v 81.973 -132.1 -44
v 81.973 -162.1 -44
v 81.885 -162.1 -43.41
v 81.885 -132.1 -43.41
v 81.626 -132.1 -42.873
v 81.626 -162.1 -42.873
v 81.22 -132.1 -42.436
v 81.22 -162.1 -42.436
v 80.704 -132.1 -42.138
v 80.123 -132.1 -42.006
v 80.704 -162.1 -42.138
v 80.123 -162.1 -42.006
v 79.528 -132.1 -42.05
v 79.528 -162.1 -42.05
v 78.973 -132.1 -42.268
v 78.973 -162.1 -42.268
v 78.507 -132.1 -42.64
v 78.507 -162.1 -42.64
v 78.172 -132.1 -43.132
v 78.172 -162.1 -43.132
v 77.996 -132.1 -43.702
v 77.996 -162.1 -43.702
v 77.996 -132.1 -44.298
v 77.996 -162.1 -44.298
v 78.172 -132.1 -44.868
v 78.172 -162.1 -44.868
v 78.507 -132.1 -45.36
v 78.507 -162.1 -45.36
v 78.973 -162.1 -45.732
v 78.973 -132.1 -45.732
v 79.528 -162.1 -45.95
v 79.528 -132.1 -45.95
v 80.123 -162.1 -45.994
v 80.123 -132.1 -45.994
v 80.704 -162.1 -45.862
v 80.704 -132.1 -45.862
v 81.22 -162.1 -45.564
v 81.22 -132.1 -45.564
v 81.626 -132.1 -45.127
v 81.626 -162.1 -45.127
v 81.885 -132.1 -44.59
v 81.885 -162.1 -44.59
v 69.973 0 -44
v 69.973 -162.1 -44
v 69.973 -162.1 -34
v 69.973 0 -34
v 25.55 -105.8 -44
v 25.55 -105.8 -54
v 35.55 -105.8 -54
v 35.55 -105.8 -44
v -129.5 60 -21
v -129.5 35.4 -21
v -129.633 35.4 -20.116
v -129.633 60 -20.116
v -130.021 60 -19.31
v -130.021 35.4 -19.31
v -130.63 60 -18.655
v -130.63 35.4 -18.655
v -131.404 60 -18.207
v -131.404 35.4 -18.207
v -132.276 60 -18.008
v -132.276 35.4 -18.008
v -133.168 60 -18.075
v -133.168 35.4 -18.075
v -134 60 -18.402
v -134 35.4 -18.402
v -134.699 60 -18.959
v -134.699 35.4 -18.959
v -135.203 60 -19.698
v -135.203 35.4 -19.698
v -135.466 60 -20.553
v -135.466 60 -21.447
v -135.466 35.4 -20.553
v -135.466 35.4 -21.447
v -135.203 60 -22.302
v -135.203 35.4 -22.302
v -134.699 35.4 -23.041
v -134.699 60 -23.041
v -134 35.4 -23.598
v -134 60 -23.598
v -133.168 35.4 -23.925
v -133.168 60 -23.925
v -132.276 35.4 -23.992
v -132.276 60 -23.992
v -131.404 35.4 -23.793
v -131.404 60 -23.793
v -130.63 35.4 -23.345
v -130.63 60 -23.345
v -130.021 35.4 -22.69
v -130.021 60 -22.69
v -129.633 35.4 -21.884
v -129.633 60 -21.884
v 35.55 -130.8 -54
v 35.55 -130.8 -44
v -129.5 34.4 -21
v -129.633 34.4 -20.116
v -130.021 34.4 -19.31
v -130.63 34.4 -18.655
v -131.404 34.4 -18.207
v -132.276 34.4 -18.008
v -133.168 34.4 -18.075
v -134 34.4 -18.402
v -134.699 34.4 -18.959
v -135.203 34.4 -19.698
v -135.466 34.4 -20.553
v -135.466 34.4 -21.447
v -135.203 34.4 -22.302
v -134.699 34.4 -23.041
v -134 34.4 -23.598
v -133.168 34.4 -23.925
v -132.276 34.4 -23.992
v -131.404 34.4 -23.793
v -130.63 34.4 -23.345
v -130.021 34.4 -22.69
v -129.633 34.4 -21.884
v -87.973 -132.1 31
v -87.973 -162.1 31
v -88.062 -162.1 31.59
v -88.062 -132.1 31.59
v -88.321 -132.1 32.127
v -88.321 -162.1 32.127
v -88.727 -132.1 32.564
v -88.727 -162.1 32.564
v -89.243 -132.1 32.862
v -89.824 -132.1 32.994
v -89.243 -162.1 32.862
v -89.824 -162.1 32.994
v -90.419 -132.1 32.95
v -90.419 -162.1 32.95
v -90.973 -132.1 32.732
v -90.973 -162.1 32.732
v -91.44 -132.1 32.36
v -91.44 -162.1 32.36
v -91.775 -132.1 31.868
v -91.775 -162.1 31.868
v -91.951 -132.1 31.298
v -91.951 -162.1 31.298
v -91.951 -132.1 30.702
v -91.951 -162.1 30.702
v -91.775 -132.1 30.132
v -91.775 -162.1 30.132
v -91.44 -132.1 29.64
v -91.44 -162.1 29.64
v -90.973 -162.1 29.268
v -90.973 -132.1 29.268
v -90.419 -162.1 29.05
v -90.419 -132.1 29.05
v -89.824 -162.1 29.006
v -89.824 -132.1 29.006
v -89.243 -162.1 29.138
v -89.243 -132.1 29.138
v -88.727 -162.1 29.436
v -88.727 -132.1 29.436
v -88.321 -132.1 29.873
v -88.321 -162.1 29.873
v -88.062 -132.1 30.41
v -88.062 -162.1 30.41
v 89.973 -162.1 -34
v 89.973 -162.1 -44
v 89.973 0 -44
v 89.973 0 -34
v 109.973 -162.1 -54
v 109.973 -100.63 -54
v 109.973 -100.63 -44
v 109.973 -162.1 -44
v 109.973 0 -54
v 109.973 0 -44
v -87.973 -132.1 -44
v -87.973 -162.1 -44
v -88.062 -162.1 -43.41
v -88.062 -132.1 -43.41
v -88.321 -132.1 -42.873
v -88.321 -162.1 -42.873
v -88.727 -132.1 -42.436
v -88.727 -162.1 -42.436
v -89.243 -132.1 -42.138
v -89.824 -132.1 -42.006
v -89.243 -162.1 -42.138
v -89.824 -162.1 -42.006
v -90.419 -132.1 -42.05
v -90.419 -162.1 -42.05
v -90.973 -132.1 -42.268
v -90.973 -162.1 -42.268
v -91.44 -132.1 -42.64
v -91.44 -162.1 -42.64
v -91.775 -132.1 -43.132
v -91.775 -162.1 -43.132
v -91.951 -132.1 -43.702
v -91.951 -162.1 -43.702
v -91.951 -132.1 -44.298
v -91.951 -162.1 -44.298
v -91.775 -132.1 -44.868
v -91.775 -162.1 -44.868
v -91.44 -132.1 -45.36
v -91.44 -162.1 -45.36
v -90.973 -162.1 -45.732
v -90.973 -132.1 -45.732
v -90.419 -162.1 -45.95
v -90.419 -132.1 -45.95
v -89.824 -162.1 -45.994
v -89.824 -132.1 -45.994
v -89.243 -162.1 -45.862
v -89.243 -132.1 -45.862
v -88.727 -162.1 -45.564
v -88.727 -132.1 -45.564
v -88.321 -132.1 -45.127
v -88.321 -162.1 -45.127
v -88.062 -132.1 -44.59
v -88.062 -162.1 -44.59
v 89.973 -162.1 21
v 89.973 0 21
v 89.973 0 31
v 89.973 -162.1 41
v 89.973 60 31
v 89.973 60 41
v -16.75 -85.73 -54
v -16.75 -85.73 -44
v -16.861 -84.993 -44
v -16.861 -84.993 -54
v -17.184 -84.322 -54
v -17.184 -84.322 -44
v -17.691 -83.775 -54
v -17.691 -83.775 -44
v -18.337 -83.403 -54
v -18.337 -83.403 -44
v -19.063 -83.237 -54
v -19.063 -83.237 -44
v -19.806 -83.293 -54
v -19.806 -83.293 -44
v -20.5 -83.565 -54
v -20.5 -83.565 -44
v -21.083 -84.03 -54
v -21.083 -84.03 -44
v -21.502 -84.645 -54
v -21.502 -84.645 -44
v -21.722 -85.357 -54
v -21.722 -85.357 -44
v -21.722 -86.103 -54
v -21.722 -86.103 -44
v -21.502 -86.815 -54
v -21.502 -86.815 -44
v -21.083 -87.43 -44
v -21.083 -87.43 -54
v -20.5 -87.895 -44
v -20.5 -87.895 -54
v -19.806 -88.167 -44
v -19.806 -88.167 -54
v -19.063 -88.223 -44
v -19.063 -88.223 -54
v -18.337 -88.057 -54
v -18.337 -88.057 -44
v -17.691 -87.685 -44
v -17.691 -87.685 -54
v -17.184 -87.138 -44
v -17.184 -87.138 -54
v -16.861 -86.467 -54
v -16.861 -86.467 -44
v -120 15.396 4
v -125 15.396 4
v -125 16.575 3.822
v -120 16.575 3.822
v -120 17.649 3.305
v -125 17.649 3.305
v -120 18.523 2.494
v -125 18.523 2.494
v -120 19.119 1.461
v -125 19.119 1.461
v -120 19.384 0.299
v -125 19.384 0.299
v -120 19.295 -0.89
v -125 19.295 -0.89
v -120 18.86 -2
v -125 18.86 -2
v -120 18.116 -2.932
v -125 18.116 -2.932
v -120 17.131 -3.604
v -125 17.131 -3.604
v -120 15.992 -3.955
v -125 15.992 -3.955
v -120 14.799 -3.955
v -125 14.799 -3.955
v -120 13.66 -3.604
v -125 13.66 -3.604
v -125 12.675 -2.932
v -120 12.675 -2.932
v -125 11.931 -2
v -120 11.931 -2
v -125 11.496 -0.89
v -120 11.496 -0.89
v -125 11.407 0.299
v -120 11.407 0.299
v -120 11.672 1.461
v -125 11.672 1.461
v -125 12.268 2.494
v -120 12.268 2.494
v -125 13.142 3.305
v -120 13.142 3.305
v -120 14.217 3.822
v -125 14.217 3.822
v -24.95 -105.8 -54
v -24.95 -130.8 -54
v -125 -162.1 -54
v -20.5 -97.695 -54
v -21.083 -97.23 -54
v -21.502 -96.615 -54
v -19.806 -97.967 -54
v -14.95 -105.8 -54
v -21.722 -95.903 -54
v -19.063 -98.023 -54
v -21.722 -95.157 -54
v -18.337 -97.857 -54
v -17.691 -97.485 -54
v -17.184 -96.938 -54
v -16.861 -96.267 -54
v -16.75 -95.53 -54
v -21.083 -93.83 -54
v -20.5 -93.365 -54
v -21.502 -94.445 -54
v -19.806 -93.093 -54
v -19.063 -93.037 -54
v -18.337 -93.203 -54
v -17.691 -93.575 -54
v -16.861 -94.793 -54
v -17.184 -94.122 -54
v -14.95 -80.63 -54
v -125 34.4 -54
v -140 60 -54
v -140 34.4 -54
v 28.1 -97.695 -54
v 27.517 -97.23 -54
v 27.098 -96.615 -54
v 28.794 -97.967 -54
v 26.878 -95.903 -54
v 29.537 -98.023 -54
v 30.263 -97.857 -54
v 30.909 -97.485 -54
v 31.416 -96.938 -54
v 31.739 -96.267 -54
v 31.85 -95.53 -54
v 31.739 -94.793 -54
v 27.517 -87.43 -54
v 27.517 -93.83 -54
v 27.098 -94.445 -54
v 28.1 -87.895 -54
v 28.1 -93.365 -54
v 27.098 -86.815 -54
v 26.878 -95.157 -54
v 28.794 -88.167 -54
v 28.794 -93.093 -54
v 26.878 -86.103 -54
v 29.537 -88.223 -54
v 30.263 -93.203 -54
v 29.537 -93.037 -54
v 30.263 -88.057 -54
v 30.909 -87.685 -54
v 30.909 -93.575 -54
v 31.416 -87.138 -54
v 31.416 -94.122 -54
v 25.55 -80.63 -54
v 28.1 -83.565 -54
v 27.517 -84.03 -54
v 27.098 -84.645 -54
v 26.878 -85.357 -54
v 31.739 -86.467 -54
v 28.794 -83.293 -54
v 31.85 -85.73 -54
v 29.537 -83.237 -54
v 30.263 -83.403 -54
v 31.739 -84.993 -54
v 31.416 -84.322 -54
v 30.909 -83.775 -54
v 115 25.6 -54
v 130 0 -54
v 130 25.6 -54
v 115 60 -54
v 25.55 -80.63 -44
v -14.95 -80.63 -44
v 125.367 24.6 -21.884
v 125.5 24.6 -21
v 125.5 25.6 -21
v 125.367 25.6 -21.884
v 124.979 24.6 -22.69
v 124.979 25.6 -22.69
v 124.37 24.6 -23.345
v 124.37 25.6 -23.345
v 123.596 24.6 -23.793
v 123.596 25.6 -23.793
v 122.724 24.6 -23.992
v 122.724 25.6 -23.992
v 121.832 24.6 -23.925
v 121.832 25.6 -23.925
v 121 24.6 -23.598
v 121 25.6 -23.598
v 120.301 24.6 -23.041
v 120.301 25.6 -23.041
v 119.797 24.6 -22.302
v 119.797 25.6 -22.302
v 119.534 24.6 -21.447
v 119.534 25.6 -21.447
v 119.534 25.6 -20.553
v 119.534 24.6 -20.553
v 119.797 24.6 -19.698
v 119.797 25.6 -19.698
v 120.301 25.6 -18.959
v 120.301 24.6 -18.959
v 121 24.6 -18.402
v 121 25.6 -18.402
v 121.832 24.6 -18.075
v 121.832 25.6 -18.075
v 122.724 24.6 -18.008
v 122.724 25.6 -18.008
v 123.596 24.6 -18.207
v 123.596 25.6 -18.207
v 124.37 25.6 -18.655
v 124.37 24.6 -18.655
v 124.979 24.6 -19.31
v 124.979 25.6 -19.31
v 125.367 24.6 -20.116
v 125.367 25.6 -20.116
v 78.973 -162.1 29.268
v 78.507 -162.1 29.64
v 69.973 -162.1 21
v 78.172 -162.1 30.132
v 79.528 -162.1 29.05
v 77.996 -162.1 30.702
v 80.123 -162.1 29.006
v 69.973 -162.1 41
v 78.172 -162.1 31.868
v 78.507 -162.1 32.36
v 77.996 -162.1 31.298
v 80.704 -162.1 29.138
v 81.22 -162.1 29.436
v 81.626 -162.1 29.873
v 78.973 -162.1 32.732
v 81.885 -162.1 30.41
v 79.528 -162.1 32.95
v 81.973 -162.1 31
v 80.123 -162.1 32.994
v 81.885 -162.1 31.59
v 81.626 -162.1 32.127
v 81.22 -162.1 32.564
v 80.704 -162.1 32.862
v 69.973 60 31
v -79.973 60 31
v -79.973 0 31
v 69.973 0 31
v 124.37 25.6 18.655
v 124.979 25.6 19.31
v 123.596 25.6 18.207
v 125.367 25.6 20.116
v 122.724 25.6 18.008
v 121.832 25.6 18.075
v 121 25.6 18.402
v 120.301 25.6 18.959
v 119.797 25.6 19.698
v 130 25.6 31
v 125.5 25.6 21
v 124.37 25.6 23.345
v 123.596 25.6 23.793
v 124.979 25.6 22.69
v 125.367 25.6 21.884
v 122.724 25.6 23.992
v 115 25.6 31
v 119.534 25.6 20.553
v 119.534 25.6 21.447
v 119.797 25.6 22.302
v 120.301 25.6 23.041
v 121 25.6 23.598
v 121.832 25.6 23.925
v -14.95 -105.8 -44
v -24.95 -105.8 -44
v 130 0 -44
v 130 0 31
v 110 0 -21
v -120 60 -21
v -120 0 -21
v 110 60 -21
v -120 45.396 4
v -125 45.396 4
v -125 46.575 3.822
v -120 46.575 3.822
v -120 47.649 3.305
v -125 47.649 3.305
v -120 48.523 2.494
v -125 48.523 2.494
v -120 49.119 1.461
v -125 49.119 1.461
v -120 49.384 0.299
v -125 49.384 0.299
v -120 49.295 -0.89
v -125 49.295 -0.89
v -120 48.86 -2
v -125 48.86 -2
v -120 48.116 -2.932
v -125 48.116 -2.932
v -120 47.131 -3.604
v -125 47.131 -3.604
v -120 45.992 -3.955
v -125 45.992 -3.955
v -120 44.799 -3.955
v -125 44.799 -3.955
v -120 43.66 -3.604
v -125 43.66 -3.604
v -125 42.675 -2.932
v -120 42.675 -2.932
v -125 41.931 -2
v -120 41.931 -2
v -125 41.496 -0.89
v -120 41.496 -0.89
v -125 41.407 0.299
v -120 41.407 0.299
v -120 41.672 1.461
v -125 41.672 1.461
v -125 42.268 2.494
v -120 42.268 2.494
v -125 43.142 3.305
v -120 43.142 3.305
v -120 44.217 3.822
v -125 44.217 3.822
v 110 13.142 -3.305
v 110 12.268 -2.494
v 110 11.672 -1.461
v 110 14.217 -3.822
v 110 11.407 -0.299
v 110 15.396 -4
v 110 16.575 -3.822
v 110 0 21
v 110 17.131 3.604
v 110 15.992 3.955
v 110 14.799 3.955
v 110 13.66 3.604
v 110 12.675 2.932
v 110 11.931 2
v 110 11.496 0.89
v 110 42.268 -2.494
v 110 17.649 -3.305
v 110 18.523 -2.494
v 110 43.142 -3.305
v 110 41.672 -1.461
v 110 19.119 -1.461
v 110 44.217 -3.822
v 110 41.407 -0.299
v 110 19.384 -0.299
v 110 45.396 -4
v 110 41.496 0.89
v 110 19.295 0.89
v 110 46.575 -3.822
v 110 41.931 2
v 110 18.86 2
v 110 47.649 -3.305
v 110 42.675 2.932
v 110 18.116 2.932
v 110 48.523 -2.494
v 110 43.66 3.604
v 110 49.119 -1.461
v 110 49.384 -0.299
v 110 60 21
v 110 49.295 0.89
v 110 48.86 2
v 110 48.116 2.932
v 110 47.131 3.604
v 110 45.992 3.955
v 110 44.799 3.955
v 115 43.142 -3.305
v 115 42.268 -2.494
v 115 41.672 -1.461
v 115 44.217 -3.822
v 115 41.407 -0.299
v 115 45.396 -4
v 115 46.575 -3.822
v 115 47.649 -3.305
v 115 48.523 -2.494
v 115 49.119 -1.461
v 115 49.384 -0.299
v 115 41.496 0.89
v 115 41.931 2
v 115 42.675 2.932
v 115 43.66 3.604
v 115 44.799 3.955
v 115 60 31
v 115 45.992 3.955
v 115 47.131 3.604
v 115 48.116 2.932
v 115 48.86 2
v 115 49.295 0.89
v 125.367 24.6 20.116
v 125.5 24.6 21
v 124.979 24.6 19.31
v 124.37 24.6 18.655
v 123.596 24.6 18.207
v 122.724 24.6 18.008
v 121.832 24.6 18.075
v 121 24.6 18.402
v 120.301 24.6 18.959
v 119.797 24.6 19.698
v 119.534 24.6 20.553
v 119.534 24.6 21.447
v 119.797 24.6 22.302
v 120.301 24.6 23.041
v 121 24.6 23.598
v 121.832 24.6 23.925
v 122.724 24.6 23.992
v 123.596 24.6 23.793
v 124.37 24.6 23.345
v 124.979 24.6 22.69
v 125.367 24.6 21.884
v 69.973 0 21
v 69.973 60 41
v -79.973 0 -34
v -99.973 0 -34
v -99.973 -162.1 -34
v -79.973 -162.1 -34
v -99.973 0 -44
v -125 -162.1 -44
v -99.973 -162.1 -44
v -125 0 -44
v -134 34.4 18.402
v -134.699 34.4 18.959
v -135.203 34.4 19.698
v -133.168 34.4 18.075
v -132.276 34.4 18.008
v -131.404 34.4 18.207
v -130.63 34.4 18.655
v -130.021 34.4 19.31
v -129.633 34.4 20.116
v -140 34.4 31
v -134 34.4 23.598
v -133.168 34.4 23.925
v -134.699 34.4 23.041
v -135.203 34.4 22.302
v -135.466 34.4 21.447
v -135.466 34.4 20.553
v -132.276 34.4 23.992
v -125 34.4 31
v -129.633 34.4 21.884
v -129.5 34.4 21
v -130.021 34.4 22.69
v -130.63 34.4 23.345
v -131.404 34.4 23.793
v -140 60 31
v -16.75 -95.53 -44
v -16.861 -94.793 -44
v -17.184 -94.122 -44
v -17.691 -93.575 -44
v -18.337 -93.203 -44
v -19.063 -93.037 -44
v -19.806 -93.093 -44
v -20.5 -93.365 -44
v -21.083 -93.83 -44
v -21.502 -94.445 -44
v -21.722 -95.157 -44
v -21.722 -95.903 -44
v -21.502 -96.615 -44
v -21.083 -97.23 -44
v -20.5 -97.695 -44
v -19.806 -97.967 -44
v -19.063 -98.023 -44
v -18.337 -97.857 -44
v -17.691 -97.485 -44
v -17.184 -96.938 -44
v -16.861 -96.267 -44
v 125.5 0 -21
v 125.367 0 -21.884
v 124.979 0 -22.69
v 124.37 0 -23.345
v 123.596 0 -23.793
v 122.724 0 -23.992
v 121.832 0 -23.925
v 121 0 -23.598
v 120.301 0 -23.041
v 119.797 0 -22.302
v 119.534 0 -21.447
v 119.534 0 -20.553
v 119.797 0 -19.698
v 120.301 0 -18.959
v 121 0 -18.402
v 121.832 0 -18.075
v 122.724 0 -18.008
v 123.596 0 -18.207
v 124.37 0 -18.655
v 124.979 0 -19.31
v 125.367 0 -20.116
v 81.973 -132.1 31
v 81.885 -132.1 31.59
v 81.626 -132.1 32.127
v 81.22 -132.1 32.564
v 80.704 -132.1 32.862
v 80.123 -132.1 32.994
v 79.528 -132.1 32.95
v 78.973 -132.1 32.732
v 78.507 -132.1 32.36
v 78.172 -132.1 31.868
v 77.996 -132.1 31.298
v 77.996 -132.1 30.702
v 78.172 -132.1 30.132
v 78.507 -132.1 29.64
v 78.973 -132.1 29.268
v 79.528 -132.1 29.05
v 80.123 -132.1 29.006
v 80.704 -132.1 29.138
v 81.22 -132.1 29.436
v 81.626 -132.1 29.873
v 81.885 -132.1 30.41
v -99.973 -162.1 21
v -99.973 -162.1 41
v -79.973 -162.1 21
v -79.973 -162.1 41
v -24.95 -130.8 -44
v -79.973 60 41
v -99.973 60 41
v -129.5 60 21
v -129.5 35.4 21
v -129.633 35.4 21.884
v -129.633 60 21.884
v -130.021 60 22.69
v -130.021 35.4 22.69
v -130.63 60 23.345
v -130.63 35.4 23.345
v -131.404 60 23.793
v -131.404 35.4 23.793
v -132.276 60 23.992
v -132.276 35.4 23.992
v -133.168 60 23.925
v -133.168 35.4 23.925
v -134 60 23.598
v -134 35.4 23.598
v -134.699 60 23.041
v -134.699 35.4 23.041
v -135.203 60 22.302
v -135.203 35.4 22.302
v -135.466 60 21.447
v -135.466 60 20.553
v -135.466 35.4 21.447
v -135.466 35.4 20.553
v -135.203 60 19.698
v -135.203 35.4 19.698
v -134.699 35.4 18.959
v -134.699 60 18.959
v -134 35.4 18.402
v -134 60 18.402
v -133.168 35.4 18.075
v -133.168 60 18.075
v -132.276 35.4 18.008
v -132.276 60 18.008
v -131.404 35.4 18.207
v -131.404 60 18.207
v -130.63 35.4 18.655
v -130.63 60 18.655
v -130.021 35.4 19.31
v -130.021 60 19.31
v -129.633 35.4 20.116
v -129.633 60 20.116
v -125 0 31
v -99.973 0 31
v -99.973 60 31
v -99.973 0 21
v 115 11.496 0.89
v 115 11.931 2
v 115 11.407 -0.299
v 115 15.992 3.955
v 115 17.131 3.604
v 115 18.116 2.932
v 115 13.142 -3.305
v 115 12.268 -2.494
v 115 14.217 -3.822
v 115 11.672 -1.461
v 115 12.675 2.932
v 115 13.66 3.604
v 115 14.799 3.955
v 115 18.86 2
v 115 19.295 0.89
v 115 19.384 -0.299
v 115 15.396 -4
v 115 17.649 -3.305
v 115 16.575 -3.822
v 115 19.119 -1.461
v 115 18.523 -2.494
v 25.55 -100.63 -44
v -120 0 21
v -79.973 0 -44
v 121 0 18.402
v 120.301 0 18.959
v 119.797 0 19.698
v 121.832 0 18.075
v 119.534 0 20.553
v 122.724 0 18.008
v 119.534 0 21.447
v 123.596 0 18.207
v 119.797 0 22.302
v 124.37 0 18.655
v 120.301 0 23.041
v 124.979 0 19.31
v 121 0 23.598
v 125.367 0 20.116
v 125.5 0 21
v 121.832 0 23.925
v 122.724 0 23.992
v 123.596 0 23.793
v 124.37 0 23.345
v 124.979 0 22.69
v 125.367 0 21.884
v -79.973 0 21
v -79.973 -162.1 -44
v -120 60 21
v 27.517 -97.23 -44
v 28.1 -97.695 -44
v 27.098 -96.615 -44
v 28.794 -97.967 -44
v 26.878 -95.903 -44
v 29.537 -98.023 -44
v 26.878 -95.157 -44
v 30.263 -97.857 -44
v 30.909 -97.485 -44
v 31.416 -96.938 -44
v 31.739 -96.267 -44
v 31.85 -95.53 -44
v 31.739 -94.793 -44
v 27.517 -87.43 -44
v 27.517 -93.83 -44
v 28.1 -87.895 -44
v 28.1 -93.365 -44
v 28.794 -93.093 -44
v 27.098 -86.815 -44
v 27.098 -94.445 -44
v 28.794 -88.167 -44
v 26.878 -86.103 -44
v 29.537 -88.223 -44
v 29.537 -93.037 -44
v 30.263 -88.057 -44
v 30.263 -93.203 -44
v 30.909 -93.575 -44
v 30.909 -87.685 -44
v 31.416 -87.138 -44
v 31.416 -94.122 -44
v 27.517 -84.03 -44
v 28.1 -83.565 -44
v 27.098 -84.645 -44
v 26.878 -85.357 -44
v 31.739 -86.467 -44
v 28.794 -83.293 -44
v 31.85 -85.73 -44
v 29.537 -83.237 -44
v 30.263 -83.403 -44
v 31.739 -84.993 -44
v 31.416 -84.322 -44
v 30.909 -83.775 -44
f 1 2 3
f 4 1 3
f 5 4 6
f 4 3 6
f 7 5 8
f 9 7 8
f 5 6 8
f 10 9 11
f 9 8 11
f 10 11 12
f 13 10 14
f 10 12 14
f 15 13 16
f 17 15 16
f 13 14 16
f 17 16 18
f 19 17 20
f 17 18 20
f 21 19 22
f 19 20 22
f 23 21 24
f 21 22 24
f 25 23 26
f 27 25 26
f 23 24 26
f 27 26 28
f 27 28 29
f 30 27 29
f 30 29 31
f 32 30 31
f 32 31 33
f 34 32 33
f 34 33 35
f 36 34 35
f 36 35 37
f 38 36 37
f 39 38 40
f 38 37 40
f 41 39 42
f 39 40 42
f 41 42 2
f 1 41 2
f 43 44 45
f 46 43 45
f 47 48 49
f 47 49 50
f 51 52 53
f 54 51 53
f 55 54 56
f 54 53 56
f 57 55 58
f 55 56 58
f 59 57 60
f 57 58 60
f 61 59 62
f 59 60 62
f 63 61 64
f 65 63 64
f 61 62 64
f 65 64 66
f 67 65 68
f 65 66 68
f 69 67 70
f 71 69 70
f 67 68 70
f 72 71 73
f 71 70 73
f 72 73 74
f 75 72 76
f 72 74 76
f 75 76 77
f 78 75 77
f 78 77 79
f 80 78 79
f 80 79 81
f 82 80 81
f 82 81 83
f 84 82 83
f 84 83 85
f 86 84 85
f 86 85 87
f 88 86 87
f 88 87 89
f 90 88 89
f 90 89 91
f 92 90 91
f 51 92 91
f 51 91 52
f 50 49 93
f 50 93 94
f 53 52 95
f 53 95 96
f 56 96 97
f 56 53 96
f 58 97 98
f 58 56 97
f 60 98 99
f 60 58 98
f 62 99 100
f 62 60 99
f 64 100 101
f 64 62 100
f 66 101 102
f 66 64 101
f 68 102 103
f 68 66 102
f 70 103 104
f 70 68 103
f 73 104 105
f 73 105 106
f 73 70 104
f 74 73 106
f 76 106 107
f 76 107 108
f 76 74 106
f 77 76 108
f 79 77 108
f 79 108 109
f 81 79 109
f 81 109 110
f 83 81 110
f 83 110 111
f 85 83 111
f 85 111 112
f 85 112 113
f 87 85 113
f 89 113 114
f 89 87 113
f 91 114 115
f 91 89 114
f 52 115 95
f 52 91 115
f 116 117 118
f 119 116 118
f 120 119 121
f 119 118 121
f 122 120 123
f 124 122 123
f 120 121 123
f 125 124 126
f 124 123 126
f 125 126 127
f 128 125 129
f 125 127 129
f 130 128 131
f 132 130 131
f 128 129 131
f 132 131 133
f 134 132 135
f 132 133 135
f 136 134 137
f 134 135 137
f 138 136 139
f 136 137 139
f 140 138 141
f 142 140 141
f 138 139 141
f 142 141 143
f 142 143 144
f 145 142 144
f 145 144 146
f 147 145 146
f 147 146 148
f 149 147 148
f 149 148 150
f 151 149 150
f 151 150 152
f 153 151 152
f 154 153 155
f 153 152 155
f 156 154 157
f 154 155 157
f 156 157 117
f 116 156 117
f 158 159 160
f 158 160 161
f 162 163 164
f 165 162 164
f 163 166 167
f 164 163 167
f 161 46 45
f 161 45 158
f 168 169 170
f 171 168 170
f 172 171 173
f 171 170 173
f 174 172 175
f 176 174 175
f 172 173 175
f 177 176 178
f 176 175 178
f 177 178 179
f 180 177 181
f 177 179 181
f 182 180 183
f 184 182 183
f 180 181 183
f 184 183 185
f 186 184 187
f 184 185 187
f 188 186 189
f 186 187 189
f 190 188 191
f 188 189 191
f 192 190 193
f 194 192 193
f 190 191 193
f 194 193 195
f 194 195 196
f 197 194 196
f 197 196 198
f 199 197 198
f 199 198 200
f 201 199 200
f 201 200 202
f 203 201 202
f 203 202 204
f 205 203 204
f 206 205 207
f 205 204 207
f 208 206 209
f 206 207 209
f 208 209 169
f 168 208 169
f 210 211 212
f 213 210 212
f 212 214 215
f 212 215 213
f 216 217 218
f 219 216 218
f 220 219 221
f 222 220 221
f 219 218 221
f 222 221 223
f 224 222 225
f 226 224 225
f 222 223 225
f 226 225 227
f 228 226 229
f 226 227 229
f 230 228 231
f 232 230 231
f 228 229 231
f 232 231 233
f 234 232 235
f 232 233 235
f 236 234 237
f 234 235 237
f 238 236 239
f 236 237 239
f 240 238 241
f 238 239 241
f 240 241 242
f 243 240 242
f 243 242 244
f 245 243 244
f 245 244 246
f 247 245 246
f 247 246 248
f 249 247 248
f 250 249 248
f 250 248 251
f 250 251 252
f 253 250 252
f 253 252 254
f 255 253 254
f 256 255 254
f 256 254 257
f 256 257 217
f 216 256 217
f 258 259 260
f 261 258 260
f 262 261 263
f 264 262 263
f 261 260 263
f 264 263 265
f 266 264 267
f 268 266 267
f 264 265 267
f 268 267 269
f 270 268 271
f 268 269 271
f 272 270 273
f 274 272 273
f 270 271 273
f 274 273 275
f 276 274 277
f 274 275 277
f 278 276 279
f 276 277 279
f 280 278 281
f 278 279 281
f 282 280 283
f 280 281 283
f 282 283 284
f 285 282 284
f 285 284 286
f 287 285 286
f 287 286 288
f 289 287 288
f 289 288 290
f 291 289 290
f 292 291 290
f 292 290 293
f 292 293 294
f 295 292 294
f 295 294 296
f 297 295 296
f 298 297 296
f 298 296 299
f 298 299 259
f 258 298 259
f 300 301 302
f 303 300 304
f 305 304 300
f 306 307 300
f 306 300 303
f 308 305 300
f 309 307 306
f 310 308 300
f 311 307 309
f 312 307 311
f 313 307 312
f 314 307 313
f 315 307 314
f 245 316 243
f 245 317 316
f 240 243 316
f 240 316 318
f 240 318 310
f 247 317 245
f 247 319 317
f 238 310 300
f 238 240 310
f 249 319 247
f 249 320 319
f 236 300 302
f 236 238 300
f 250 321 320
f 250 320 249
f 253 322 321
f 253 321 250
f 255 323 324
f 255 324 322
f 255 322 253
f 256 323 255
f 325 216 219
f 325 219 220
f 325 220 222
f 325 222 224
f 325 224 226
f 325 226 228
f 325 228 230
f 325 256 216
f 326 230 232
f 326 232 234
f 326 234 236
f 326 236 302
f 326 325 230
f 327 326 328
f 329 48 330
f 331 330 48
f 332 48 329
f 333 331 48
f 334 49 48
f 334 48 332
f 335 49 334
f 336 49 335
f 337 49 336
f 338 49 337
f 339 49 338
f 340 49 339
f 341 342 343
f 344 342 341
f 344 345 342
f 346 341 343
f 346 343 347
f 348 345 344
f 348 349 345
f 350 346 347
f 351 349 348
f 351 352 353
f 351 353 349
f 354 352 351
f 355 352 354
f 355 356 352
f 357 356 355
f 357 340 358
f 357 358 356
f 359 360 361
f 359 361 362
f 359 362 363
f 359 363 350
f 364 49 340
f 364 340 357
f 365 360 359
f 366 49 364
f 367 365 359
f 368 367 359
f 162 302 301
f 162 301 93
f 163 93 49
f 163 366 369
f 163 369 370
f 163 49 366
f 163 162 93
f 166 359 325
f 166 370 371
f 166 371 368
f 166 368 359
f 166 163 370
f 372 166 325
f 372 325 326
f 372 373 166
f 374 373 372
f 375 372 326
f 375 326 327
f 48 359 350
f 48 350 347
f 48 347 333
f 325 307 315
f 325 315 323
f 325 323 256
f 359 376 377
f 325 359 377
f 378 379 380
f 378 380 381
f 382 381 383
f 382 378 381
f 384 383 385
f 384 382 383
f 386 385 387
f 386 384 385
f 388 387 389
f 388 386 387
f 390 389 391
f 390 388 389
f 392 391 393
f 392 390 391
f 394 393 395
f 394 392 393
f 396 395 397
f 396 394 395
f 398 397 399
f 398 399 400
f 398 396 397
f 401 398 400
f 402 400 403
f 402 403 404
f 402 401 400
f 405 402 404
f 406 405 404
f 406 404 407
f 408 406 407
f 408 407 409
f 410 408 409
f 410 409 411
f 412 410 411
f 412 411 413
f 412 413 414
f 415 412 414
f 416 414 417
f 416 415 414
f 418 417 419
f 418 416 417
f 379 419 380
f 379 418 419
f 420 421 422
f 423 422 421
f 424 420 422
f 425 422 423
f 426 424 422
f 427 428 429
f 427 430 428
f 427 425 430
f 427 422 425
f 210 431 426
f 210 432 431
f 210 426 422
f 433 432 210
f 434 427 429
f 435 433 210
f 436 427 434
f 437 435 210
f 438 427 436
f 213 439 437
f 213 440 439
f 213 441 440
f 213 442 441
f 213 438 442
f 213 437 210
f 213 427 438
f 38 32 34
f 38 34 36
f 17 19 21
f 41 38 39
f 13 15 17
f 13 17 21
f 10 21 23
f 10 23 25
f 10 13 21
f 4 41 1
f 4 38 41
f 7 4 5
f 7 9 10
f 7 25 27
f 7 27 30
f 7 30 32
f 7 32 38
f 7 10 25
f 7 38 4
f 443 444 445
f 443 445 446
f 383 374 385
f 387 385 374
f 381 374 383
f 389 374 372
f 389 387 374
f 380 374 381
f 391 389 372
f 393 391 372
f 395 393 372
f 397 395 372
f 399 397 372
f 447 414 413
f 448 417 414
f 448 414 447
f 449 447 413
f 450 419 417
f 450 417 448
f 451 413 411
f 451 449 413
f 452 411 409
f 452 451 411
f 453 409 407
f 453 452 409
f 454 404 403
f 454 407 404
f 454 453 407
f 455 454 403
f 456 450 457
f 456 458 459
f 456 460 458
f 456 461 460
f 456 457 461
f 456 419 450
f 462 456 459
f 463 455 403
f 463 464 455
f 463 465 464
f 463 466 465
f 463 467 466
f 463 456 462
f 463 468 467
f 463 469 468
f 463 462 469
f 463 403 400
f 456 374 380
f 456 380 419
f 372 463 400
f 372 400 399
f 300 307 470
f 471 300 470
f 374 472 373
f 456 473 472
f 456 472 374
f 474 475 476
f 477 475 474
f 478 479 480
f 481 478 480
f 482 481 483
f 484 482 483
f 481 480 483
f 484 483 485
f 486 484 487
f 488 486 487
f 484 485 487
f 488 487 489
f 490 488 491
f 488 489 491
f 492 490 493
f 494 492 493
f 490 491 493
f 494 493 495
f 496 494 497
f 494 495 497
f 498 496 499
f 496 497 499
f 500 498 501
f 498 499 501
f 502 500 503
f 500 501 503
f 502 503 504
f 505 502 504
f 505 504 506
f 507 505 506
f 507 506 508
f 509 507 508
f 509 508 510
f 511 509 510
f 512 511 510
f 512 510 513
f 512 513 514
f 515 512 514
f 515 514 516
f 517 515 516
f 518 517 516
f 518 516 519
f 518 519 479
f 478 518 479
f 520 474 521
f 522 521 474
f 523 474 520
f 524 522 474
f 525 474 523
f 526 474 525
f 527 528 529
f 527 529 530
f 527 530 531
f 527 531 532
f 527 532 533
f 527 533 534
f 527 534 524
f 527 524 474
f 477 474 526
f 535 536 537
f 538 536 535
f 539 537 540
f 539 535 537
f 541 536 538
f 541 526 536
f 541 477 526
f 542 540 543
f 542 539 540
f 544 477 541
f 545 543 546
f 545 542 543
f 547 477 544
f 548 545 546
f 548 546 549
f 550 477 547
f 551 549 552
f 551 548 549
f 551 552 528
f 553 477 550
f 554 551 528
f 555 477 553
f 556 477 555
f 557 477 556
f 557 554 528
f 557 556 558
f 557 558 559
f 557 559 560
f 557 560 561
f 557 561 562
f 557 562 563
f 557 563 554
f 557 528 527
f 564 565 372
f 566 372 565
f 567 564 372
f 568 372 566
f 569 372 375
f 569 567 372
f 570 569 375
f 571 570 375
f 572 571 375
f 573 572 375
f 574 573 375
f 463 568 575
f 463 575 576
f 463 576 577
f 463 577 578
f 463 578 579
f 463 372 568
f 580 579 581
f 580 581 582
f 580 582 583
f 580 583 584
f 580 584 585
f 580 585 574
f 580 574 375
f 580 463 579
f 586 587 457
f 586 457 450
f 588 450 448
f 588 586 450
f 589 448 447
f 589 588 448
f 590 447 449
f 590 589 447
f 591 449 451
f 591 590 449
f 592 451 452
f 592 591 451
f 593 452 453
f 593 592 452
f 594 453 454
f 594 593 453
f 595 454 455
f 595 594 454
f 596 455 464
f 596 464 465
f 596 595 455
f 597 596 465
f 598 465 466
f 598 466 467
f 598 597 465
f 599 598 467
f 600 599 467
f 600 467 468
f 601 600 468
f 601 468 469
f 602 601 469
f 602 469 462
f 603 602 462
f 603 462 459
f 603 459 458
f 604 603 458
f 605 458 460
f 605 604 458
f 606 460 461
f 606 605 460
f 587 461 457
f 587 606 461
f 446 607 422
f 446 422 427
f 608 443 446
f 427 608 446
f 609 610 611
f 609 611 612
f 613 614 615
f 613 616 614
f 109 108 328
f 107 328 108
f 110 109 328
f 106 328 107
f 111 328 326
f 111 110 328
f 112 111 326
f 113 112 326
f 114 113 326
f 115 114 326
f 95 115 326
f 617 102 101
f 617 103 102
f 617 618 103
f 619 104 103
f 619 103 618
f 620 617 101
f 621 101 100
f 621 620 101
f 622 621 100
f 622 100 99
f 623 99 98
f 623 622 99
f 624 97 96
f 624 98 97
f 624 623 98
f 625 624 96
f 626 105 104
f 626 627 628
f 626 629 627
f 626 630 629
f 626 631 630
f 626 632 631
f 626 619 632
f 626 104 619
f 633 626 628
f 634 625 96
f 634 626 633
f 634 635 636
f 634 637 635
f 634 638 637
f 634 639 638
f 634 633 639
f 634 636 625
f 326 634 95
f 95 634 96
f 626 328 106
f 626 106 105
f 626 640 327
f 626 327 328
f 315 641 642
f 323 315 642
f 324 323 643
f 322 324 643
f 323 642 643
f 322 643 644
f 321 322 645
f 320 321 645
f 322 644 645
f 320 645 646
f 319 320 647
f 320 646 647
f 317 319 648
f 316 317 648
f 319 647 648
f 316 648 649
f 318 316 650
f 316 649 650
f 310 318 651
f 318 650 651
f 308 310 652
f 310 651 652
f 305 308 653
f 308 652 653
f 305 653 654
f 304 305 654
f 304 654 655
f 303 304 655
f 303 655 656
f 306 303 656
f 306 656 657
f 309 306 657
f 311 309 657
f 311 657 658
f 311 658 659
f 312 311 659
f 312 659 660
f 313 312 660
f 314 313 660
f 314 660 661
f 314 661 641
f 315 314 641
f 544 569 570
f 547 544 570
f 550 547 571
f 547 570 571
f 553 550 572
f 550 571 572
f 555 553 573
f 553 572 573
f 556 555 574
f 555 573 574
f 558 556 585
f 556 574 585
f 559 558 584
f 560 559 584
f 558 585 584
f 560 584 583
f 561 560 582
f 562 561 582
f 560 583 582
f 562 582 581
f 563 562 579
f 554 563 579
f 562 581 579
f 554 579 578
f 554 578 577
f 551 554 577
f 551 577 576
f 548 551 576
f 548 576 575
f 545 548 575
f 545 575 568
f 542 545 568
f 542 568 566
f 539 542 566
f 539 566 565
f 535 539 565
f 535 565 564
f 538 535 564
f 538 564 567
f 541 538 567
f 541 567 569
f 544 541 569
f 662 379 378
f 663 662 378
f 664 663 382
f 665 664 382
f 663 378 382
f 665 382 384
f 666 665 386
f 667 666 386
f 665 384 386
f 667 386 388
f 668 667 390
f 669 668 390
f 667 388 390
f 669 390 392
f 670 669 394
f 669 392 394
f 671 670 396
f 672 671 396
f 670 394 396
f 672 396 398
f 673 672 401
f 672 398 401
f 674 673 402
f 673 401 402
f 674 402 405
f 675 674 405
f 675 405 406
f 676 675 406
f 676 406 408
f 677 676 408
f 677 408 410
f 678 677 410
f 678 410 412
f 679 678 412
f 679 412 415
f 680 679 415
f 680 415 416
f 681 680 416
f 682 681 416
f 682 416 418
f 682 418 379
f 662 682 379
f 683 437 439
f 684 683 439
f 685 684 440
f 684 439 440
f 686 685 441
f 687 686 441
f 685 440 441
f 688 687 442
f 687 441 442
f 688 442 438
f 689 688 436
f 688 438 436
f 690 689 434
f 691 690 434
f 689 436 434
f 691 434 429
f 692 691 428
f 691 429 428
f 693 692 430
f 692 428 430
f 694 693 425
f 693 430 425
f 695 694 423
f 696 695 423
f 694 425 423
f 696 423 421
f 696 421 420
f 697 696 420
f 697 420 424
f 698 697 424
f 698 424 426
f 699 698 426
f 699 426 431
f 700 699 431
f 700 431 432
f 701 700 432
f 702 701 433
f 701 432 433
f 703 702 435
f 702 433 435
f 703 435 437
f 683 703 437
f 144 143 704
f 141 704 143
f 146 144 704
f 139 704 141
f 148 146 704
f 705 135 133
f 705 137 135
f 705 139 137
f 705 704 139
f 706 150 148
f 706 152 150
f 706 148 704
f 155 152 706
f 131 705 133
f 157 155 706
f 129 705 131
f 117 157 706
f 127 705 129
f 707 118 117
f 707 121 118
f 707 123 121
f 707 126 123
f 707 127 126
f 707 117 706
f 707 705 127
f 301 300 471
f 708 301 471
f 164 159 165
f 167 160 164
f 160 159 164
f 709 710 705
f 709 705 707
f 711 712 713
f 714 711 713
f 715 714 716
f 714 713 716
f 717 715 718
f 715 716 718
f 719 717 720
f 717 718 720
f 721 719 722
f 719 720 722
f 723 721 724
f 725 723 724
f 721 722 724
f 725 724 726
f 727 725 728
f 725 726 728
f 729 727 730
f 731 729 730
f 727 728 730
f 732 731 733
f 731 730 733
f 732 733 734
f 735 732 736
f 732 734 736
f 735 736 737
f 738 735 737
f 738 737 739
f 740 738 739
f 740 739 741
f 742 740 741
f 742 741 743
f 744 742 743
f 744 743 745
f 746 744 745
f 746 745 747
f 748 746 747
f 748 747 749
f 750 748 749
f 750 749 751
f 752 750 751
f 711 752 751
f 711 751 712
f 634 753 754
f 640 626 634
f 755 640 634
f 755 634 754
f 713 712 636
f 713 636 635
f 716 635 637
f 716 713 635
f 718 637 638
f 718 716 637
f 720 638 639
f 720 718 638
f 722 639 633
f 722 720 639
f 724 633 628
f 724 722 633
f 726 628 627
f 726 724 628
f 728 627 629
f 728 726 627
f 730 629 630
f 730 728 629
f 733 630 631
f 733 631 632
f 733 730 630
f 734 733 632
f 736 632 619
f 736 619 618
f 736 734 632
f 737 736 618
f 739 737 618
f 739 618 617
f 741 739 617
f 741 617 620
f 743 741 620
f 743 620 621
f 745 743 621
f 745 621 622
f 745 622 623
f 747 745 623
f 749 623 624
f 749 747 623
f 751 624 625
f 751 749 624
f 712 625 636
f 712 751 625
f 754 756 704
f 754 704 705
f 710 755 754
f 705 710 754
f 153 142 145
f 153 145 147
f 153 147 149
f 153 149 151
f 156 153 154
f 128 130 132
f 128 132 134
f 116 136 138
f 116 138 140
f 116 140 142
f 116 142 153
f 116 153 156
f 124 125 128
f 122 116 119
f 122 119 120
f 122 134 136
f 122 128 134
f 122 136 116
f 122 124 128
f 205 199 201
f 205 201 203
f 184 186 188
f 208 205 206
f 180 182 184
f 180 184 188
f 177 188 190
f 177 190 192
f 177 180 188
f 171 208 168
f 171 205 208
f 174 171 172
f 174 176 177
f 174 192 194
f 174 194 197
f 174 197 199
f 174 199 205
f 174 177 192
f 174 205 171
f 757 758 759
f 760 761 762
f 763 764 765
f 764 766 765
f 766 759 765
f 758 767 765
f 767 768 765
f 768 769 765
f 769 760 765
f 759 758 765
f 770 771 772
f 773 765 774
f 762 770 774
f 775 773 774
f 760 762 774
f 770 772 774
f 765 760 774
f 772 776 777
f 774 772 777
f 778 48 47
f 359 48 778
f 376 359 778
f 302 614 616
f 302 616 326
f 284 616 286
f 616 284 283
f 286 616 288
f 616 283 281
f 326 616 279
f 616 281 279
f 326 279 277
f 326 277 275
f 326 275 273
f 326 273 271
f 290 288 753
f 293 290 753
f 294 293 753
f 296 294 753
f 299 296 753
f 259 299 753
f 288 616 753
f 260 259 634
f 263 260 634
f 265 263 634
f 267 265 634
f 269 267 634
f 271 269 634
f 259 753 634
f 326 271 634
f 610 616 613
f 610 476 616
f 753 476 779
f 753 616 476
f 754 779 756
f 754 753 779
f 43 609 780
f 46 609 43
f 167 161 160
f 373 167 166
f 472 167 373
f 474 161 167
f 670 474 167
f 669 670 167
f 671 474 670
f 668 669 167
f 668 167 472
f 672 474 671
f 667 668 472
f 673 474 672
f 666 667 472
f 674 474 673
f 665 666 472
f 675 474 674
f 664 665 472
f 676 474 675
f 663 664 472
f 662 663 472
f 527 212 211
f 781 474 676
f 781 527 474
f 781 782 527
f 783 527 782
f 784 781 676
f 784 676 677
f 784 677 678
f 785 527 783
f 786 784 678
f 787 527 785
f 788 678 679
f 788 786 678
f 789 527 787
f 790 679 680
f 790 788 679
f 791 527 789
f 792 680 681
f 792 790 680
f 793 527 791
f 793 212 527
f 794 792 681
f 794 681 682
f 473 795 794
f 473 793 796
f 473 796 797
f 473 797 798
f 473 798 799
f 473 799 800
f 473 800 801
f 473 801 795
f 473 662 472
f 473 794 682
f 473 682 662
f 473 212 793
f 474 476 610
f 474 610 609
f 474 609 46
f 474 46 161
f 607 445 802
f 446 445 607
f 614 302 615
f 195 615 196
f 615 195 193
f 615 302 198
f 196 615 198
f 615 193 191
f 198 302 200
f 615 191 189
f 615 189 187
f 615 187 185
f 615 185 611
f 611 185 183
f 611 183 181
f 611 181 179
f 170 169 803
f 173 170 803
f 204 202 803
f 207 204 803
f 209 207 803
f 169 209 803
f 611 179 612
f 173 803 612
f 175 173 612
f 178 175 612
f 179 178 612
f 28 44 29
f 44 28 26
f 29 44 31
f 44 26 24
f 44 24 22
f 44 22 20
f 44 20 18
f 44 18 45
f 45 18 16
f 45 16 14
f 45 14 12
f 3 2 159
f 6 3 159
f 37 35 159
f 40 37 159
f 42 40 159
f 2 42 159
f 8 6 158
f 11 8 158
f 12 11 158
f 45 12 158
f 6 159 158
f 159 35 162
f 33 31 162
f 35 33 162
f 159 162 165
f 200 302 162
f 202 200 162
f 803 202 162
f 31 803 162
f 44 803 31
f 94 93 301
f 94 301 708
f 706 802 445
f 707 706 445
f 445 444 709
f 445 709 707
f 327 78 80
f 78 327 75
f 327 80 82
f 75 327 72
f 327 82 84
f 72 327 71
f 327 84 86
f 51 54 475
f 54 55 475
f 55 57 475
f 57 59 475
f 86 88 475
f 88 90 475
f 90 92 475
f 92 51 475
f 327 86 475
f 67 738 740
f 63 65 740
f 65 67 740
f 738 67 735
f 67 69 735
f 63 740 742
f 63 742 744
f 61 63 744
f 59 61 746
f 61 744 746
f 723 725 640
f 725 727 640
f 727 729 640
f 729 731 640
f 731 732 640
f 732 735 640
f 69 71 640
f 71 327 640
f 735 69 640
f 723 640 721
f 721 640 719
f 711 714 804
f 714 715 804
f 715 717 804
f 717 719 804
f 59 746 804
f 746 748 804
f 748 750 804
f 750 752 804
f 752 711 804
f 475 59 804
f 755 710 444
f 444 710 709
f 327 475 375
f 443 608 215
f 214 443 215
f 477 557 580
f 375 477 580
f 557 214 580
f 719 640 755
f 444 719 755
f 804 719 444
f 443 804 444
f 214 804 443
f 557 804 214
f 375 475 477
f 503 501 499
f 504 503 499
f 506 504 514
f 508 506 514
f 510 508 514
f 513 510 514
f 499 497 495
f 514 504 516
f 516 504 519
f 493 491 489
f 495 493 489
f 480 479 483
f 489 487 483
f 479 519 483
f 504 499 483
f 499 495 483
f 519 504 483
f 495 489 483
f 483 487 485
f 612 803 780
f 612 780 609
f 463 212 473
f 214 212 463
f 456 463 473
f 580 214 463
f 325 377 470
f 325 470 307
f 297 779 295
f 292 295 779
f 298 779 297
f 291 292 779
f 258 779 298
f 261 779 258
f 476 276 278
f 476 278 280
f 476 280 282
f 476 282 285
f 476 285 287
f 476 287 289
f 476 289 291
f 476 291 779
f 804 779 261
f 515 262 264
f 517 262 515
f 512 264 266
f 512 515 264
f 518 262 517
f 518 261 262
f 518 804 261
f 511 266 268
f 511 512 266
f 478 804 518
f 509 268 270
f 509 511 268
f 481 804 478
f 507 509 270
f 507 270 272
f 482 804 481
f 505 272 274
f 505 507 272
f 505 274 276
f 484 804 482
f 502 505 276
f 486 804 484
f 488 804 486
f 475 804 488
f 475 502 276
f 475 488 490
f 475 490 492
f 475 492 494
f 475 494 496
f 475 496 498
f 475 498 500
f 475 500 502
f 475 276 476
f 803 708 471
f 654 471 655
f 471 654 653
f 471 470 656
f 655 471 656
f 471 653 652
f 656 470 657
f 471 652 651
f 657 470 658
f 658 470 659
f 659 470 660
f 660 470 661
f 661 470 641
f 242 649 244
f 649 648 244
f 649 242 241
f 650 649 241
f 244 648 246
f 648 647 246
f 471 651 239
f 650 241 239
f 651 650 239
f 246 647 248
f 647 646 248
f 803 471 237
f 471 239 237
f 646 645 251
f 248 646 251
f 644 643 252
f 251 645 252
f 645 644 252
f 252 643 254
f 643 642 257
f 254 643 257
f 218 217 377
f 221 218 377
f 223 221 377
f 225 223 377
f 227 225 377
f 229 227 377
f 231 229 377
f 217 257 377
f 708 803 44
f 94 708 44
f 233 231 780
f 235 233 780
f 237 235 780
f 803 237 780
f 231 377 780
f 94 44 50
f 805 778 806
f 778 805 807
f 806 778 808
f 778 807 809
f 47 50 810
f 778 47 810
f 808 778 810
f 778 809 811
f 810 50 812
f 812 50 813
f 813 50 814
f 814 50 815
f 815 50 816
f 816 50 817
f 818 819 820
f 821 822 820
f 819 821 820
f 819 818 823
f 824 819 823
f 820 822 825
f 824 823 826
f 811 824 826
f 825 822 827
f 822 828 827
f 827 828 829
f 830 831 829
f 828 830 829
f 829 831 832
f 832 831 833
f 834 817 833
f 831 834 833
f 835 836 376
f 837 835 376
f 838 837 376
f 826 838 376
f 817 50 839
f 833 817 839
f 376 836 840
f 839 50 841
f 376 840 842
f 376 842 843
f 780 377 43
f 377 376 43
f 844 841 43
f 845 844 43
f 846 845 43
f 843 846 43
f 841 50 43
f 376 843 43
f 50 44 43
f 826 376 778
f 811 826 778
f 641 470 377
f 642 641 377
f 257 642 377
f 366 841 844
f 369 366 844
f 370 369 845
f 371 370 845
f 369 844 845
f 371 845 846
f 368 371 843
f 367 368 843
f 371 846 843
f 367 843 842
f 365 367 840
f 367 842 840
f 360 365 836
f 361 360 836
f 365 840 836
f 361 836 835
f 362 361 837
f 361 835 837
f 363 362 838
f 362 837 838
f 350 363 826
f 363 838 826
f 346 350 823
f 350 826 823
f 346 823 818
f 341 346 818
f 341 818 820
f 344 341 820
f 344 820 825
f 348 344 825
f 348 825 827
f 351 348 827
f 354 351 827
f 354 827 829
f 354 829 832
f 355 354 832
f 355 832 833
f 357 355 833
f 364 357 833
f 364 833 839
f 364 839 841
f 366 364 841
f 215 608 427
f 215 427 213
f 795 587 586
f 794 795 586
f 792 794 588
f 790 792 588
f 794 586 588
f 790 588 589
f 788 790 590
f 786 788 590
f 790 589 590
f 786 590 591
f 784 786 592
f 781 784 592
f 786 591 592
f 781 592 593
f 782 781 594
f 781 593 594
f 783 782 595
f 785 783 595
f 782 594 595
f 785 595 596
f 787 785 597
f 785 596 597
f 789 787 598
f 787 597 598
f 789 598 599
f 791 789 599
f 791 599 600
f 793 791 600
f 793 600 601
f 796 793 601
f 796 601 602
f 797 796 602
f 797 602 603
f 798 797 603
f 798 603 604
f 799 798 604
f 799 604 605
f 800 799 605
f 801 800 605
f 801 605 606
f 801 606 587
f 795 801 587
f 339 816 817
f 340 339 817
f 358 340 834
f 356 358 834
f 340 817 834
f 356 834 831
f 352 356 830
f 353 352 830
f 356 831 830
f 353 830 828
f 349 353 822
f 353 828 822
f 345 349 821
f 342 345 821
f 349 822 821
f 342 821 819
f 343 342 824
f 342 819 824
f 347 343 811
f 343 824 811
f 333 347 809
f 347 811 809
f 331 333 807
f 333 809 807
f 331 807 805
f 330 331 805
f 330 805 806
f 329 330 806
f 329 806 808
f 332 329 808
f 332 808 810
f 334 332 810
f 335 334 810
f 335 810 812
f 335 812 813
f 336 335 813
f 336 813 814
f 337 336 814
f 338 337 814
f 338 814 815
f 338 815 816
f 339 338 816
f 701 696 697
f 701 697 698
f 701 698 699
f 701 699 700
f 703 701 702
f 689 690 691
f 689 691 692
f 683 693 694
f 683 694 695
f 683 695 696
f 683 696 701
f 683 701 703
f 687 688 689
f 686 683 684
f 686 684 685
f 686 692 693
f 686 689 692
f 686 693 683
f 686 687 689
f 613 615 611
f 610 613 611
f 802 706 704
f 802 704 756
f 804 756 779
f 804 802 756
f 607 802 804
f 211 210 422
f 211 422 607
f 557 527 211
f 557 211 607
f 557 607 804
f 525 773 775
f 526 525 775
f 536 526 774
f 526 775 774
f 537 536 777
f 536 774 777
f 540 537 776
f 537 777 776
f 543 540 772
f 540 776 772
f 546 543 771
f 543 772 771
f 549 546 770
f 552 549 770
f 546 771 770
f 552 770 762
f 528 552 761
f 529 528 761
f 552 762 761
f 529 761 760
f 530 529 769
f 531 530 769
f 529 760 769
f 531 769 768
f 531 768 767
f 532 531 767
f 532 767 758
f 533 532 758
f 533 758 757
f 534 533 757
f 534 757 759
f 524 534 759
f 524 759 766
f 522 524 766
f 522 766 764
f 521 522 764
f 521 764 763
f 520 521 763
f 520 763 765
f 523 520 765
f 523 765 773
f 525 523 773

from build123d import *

# Parameters (mm, degrees)
SKETCH2_W            = 230
SKETCH2_H            = 42
BOSS_EXTRUDE1_DEPTH  = 60
BOSS_EXTRUDE2_DEPTH  = 150
SKETCH5_R            = 4
CUT_EXTRUDE1_DEPTH   = 277
SKETCH7_R            = 4
BOSS_EXTRUDE3_DEPTH  = 20
SKETCH7_2_R          = 4
CUT_EXTRUDE2_DEPTH   = 10
SKETCH8_W            = 62
SKETCH8_H            = 24.6
BOSS_EXTRUDE4_DEPTH  = 14
SKETCH9_W            = 62
SKETCH9_H            = 24.6
BOSS_EXTRUDE5_DEPTH  = 14
SKETCH15_W           = 42
SKETCH15_H           = 60
SKETCH15_R           = 4
CUT_EXTRUDE3_DEPTH   = 5
SKETCH17_W           = 42
SKETCH17_H           = 60
SKETCH17_R           = 4
CUT_EXTRUDE4_DEPTH   = 5
SKETCH18_W           = 1
SKETCH18_H           = 62
BOSS_EXTRUDE9_DEPTH  = 24.6
SKETCH18_3_R         = 3
CUT_EXTRUDE5_DEPTH   = 35
SKETCH19_W           = 1
SKETCH19_H           = 62
BOSS_EXTRUDE10_DEPTH = 24.6
SKETCH19_3_R         = 3
CUT_EXTRUDE6_DEPTH   = 27
SKETCH20_W           = 15
SKETCH20_H           = 62
SKETCH20_R           = 3
BOSS_EXTRUDE11_DEPTH = 1
SKETCH21_W           = 15
SKETCH21_H           = 62
SKETCH21_R           = 3
BOSS_EXTRUDE12_DEPTH = 1
SKETCH23_W           = 255
SKETCH23_H           = 10
BOSS_EXTRUDE13_DEPTH = 150
SKETCH25_W           = 251.390716306
SKETCH25_H           = 22.262694164
CUT_EXTRUDE7_DEPTH   = 150
BOSS_EXTRUDE16_DEPTH = 17
CUT_EXTRUDE8_DEPTH   = 150
SKETCH28_W           = 255
SKETCH28_H           = 13
CUT_EXTRUDE9_DEPTH   = 167
BOSS_EXTRUDE18_DEPTH = 6
CUT_EXTRUDE10_DEPTH  = 43
SKETCH32_W           = 10
SKETCH32_H           = 20
BOSS_EXTRUDE19_DEPTH = 7.5
SKETCH33_W           = 10
SKETCH33_H           = 20
BOSS_EXTRUDE20_DEPTH = 8
SKETCH38_R           = 2.5
CUT_EXTRUDE12_DEPTH  = 16
SKETCH40_W           = 20.026518065
SKETCH40_H           = 12.666252083
CUT_EXTRUDE13_DEPTH  = 116
SKETCH41_W           = 84.423481935
SKETCH41_H           = 10
SKETCH41_W_2         = 110.05
BOSS_EXTRUDE21_DEPTH = 61.47
SKETCH42_W           = 10
SKETCH42_H           = 25
CUT_EXTRUDE14_DEPTH  = 10
SKETCH40_3_W         = 20
SKETCH40_3_H         = 10
BOSS_EXTRUDE22_DEPTH = 162.1
SKETCH43_W           = 10
SKETCH43_H           = 31.300449652
BOSS_EXTRUDE23_DEPTH = 40.5
BOSS_EXTRUDE24_START = -60
SKETCH46_W           = 20
SKETCH46_H           = 20
BOSS_EXTRUDE24_DEPTH = 222.1
SKETCH48_R           = 2
CUT_EXTRUDE15_DEPTH  = 30


with BuildPart() as part:
    # Sketch2 → Boss-Extrude1 (new body)
    with BuildSketch(Plane(origin=(0, 0, 0), x_dir=(1, 0, 0), z_dir=(0, 1, 0))):
        Polygon((-125, -31), (125, -31), (125, -21), (125, 0), (125, 21), (125, 31), (-125, 31), (-125, 21), (-125, 0), (-125, -21), align=None)
        Rectangle(SKETCH2_W, SKETCH2_H, mode=Mode.SUBTRACT)
    extrude(amount=BOSS_EXTRUDE1_DEPTH)

    # Sketch4 → Boss-Extrude2 (add)
    with BuildSketch(Plane.XZ):
        Polygon((125, 31), (-125, 31), (-125, 21), (-115, 21), (125, 21), align=None)
    extrude(amount=BOSS_EXTRUDE2_DEPTH)

    # Sketch5 → Cut-Extrude1 (cut)
    with BuildSketch(Plane.ZY.offset(125)):
        with Locations((0, 15.395589143)):
            Circle(SKETCH5_R)
        with Locations((0, 45.395589143)):
            Circle(SKETCH5_R)
    extrude(amount=-CUT_EXTRUDE1_DEPTH, mode=Mode.SUBTRACT)

    # Sketch7 → Boss-Extrude3 (add)
    with BuildSketch(Plane(origin=(125, 0, 0), x_dir=(0, 0, -1), z_dir=(1, 0, 0))):
        Polygon((-21, -150), (-31, -150), (-31, 60), (31, 60), (31, 0), (-21, 0), align=None)
        with Locations((0, 15.395589143)):
            Circle(SKETCH7_R, mode=Mode.SUBTRACT)
        with Locations((0, 45.395589143)):
            Circle(SKETCH7_R, mode=Mode.SUBTRACT)
    extrude(amount=-BOSS_EXTRUDE3_DEPTH)

    # Sketch7<2> → Cut-Extrude2 (cut)
    with BuildSketch(Plane(origin=(125, 0, 0), x_dir=(0, 0, -1), z_dir=(1, 0, 0))):
        Polygon((-21, -150), (-31, -150), (-31, 60), (31, 60), (31, 0), (-21, 0), align=None)
        with Locations((0, 15.395589143)):
            Circle(SKETCH7_2_R, mode=Mode.SUBTRACT)
        with Locations((0, 45.395589143)):
            Circle(SKETCH7_2_R, mode=Mode.SUBTRACT)
    extrude(amount=-CUT_EXTRUDE2_DEPTH, mode=Mode.SUBTRACT)

    # Sketch8 → Boss-Extrude4 (add)
    with BuildSketch(Plane(origin=(115, 0, 0), x_dir=(0, 0, -1), z_dir=(1, 0, 0))):
        with Locations((0, 12.3)):
            Rectangle(SKETCH8_W, SKETCH8_H)
    extrude(amount=BOSS_EXTRUDE4_DEPTH)

    # Sketch9 → Boss-Extrude5 (add)
    with BuildSketch(Plane.ZY.offset(125)):
        with Locations((0, 47.7)):
            Rectangle(SKETCH9_W, SKETCH9_H)
    extrude(amount=BOSS_EXTRUDE5_DEPTH)

    # Sketch15 → Cut-Extrude3 (cut)
    with BuildSketch(Plane.ZY.offset(-105)):
        with Locations((0, 30)):
            Rectangle(SKETCH15_W, SKETCH15_H)
        with Locations((0, 15.395589143)):
            Circle(SKETCH15_R, mode=Mode.SUBTRACT)
        with Locations((0, 45.395589143)):
            Circle(SKETCH15_R, mode=Mode.SUBTRACT)
    extrude(amount=-CUT_EXTRUDE3_DEPTH, mode=Mode.SUBTRACT)

    # Sketch17 → Cut-Extrude4 (cut)
    with BuildSketch(Plane(origin=(-115, 0, 0), x_dir=(0, 0, -1), z_dir=(1, 0, 0))):
        with Locations((0, 30)):
            Rectangle(SKETCH17_W, SKETCH17_H)
        with Locations((0, 45.395589143)):
            Circle(SKETCH17_R, mode=Mode.SUBTRACT)
        with Locations((0, 15.395589143)):
            Circle(SKETCH17_R, mode=Mode.SUBTRACT)
    extrude(amount=-CUT_EXTRUDE4_DEPTH, mode=Mode.SUBTRACT)

    # Sketch18 → Boss-Extrude9 (add)
    with BuildSketch(Plane.XZ.offset(-35.4)):
        with Locations((-139.5, 0)):
            Rectangle(SKETCH18_W, SKETCH18_H)
    extrude(amount=-BOSS_EXTRUDE9_DEPTH)

    # Sketch18<3> → Cut-Extrude5 (cut)
    with BuildSketch(Plane.XZ.offset(-35.4)):
        with Locations((-132.5, 21)):
            Circle(SKETCH18_3_R)
        with Locations((-132.5, -21)):
            Circle(SKETCH18_3_R)
    extrude(amount=-CUT_EXTRUDE5_DEPTH, mode=Mode.SUBTRACT)

    # Sketch19 → Boss-Extrude10 (add)
    with BuildSketch(Plane(origin=(0, 24.6, 0), x_dir=(1, 0, 0), z_dir=(0, 1, 0))):
        with Locations((129.5, 0)):
            Rectangle(SKETCH19_W, SKETCH19_H)
    extrude(amount=-BOSS_EXTRUDE10_DEPTH)

    # Sketch19<3> → Cut-Extrude6 (cut)
    with BuildSketch(Plane(origin=(0, 24.6, 0), x_dir=(1, 0, 0), z_dir=(0, 1, 0))):
        with Locations((122.5, 21)):
            Circle(SKETCH19_3_R)
        with Locations((122.5, -21)):
            Circle(SKETCH19_3_R)
    extrude(amount=-CUT_EXTRUDE6_DEPTH, mode=Mode.SUBTRACT)

    # Sketch20 → Boss-Extrude11 (add)
    with BuildSketch(Plane(origin=(0, 24.6, 0), x_dir=(1, 0, 0), z_dir=(0, 1, 0))):
        with Locations((122.5, 0)):
            Rectangle(SKETCH20_W, SKETCH20_H)
        with Locations((122.5, -21)):
            Circle(SKETCH20_R, mode=Mode.SUBTRACT)
        with Locations((122.5, 21)):
            Circle(SKETCH20_R, mode=Mode.SUBTRACT)
    extrude(amount=BOSS_EXTRUDE11_DEPTH)

    # Sketch21 → Boss-Extrude12 (add)
    with BuildSketch(Plane.XZ.offset(-35.4)):
        with Locations((-132.5, 0)):
            Rectangle(SKETCH21_W, SKETCH21_H)
        with Locations((-132.5, 21)):
            Circle(SKETCH21_R, mode=Mode.SUBTRACT)
        with Locations((-132.5, -21)):
            Circle(SKETCH21_R, mode=Mode.SUBTRACT)
    extrude(amount=BOSS_EXTRUDE12_DEPTH)

    # Sketch23 → Boss-Extrude13 (add)
    with BuildSketch(Plane.XZ):
        with Locations((2.5, -26)):
            Rectangle(SKETCH23_W, SKETCH23_H)
    extrude(amount=BOSS_EXTRUDE13_DEPTH)

    # Sketch25 → Cut-Extrude7 (cut)
    with BuildSketch(Plane.XZ):
        with Locations((-4.583562675, 27.327499947)):
            Rectangle(SKETCH25_W, SKETCH25_H)
    extrude(amount=CUT_EXTRUDE7_DEPTH, mode=Mode.SUBTRACT)

    # Sketch26 → Boss-Extrude16 (add)
    with BuildSketch(Plane(origin=(0, 0, -31), x_dir=(-1, 0, 0), z_dir=(0, 0, -1))):
        Polygon((125, -150), (-130, -150), (-130, 25.6), (-115, 25.6), (-115, 60), (125, 60), (140, 60), (140, 34.4), (125, 34.4), (125, 25.6), align=None)
    extrude(amount=BOSS_EXTRUDE16_DEPTH)

    # Sketch27 → Cut-Extrude8 (cut)
    with BuildSketch(Plane.XZ):
        Polygon((110, -31), (132.347433228, -31), (132.347433228, -21), (110, -21), (-153.412168614, -21), (-153.412168614, -31), align=None)
    extrude(amount=CUT_EXTRUDE8_DEPTH, mode=Mode.SUBTRACT)

    # Sketch28 → Cut-Extrude9 (cut)
    with BuildSketch(Plane.XZ):
        with Locations((2.5, -37.5)):
            Rectangle(SKETCH28_W, SKETCH28_H)
    extrude(amount=CUT_EXTRUDE9_DEPTH, mode=Mode.SUBTRACT)

    # Sketch29 → Boss-Extrude18 (add)
    with BuildSketch(Plane(origin=(0, 0, -48), x_dir=(-1, 0, 0), z_dir=(0, 0, -1))):
        Polygon((125, -150), (-130, -150), (-130, 25.6), (-115, 25.6), (-115, 60), (125, 60), (140, 60), (140, 34.4), (125, 34.4), (125, 25.6), align=None)
    extrude(amount=BOSS_EXTRUDE18_DEPTH)

    # Sketch31 → Cut-Extrude10 (cut)
    with BuildSketch(Plane.XY.offset(-44)):
        Polygon((33.05, -150), (130, -150), (130, -100.63), (33.05, -100.63), (33.05, -80.63), (-22.95, -80.63), (-22.95, -100.63), (-125, -100.63), (-125, -150), align=None)
    extrude(amount=-CUT_EXTRUDE10_DEPTH, mode=Mode.SUBTRACT)

    # Sketch32 → Boss-Extrude19 (add)
    with BuildSketch(Plane.ZY.offset(-33.05)):
        with Locations((-49, -90.63)):
            Rectangle(SKETCH32_W, SKETCH32_H)
    extrude(amount=BOSS_EXTRUDE19_DEPTH)

    # Sketch33 → Boss-Extrude20 (add)
    with BuildSketch(Plane(origin=(-22.95, 0, 0), x_dir=(0, 0, -1), z_dir=(1, 0, 0))):
        with Locations((49, -90.63)):
            Rectangle(SKETCH33_W, SKETCH33_H)
    extrude(amount=BOSS_EXTRUDE20_DEPTH)

    # Sketch38 → Cut-Extrude12 (cut)
    with BuildSketch(Plane.XY.offset(-44)):
        with Locations((29.35, -95.53)):
            Circle(SKETCH38_R)
        with Locations((29.35, -85.73)):
            Circle(SKETCH38_R)
        with Locations((-19.25, -95.53)):
            Circle(SKETCH38_R)
        with Locations((-19.25, -85.73)):
            Circle(SKETCH38_R)
    extrude(amount=-CUT_EXTRUDE12_DEPTH, mode=Mode.SUBTRACT)

    # Sketch40 → Cut-Extrude13 (cut)
    with BuildSketch(Plane.XZ):
        with Locations((119.986740967, -50.333126042)):
            Rectangle(SKETCH40_W, SKETCH40_H)
    extrude(amount=CUT_EXTRUDE13_DEPTH, mode=Mode.SUBTRACT)

    # Sketch41 → Boss-Extrude21 (add)
    with BuildSketch(Plane.XZ.offset(100.63)):
        with Locations((67.761740968, -49)):
            Rectangle(SKETCH41_W, SKETCH41_H)
        with Locations((-69.975, -49)):
            Rectangle(SKETCH41_W_2, SKETCH41_H)
    extrude(amount=BOSS_EXTRUDE21_DEPTH)

    # Sketch42 → Cut-Extrude14 (cut)
    with BuildSketch(Plane.ZY.offset(-25.55)):
        with Locations((-49, -118.299550348)):
            Rectangle(SKETCH42_W, SKETCH42_H)
    cut_extrude14 = extrude(amount=-CUT_EXTRUDE14_DEPTH, mode=Mode.SUBTRACT)

    # Mirror1: Cut-Extrude14 across plane
    add(cut_extrude14.mirror(Plane.ZY.offset(-5.3)), mode=Mode.SUBTRACT)

    # Sketch40<3> → Boss-Extrude22 (add)
    with BuildSketch(Plane.XZ):
        with Locations((79.973481935, -39)):
            Rectangle(SKETCH40_3_W, SKETCH40_3_H)
        with Locations((-89.973481935, -39)):
            Rectangle(SKETCH40_3_W, SKETCH40_3_H)
    extrude(amount=BOSS_EXTRUDE22_DEPTH)

    # Sketch43 → Boss-Extrude23 (add)
    with BuildSketch(Plane.ZY.offset(-25.55)):
        with Locations((-49, -146.449775174)):
            Rectangle(SKETCH43_W, SKETCH43_H)
    extrude(amount=BOSS_EXTRUDE23_DEPTH)

    # Sketch46 → Boss-Extrude24 (add)
    with BuildSketch(Plane.XZ.offset(BOSS_EXTRUDE24_START)):
        with Locations((79.973481935, 31)):
            Rectangle(SKETCH46_W, SKETCH46_H)
        with Locations((-89.973481935, 31)):
            Rectangle(SKETCH46_W, SKETCH46_H)
    extrude(amount=BOSS_EXTRUDE24_DEPTH)

    # Sketch48 → Cut-Extrude15 (cut)
    with BuildSketch(Plane.XZ.offset(162.1)):
        with Locations((79.973481935, 31)):
            Circle(SKETCH48_R)
        with Locations((79.973481935, -44)):
            Circle(SKETCH48_R)
        with Locations((-89.973481935, 31)):
            Circle(SKETCH48_R)
        with Locations((-89.973481935, -44)):
            Circle(SKETCH48_R)
    extrude(amount=-CUT_EXTRUDE15_DEPTH, mode=Mode.SUBTRACT)


solid = part.part
